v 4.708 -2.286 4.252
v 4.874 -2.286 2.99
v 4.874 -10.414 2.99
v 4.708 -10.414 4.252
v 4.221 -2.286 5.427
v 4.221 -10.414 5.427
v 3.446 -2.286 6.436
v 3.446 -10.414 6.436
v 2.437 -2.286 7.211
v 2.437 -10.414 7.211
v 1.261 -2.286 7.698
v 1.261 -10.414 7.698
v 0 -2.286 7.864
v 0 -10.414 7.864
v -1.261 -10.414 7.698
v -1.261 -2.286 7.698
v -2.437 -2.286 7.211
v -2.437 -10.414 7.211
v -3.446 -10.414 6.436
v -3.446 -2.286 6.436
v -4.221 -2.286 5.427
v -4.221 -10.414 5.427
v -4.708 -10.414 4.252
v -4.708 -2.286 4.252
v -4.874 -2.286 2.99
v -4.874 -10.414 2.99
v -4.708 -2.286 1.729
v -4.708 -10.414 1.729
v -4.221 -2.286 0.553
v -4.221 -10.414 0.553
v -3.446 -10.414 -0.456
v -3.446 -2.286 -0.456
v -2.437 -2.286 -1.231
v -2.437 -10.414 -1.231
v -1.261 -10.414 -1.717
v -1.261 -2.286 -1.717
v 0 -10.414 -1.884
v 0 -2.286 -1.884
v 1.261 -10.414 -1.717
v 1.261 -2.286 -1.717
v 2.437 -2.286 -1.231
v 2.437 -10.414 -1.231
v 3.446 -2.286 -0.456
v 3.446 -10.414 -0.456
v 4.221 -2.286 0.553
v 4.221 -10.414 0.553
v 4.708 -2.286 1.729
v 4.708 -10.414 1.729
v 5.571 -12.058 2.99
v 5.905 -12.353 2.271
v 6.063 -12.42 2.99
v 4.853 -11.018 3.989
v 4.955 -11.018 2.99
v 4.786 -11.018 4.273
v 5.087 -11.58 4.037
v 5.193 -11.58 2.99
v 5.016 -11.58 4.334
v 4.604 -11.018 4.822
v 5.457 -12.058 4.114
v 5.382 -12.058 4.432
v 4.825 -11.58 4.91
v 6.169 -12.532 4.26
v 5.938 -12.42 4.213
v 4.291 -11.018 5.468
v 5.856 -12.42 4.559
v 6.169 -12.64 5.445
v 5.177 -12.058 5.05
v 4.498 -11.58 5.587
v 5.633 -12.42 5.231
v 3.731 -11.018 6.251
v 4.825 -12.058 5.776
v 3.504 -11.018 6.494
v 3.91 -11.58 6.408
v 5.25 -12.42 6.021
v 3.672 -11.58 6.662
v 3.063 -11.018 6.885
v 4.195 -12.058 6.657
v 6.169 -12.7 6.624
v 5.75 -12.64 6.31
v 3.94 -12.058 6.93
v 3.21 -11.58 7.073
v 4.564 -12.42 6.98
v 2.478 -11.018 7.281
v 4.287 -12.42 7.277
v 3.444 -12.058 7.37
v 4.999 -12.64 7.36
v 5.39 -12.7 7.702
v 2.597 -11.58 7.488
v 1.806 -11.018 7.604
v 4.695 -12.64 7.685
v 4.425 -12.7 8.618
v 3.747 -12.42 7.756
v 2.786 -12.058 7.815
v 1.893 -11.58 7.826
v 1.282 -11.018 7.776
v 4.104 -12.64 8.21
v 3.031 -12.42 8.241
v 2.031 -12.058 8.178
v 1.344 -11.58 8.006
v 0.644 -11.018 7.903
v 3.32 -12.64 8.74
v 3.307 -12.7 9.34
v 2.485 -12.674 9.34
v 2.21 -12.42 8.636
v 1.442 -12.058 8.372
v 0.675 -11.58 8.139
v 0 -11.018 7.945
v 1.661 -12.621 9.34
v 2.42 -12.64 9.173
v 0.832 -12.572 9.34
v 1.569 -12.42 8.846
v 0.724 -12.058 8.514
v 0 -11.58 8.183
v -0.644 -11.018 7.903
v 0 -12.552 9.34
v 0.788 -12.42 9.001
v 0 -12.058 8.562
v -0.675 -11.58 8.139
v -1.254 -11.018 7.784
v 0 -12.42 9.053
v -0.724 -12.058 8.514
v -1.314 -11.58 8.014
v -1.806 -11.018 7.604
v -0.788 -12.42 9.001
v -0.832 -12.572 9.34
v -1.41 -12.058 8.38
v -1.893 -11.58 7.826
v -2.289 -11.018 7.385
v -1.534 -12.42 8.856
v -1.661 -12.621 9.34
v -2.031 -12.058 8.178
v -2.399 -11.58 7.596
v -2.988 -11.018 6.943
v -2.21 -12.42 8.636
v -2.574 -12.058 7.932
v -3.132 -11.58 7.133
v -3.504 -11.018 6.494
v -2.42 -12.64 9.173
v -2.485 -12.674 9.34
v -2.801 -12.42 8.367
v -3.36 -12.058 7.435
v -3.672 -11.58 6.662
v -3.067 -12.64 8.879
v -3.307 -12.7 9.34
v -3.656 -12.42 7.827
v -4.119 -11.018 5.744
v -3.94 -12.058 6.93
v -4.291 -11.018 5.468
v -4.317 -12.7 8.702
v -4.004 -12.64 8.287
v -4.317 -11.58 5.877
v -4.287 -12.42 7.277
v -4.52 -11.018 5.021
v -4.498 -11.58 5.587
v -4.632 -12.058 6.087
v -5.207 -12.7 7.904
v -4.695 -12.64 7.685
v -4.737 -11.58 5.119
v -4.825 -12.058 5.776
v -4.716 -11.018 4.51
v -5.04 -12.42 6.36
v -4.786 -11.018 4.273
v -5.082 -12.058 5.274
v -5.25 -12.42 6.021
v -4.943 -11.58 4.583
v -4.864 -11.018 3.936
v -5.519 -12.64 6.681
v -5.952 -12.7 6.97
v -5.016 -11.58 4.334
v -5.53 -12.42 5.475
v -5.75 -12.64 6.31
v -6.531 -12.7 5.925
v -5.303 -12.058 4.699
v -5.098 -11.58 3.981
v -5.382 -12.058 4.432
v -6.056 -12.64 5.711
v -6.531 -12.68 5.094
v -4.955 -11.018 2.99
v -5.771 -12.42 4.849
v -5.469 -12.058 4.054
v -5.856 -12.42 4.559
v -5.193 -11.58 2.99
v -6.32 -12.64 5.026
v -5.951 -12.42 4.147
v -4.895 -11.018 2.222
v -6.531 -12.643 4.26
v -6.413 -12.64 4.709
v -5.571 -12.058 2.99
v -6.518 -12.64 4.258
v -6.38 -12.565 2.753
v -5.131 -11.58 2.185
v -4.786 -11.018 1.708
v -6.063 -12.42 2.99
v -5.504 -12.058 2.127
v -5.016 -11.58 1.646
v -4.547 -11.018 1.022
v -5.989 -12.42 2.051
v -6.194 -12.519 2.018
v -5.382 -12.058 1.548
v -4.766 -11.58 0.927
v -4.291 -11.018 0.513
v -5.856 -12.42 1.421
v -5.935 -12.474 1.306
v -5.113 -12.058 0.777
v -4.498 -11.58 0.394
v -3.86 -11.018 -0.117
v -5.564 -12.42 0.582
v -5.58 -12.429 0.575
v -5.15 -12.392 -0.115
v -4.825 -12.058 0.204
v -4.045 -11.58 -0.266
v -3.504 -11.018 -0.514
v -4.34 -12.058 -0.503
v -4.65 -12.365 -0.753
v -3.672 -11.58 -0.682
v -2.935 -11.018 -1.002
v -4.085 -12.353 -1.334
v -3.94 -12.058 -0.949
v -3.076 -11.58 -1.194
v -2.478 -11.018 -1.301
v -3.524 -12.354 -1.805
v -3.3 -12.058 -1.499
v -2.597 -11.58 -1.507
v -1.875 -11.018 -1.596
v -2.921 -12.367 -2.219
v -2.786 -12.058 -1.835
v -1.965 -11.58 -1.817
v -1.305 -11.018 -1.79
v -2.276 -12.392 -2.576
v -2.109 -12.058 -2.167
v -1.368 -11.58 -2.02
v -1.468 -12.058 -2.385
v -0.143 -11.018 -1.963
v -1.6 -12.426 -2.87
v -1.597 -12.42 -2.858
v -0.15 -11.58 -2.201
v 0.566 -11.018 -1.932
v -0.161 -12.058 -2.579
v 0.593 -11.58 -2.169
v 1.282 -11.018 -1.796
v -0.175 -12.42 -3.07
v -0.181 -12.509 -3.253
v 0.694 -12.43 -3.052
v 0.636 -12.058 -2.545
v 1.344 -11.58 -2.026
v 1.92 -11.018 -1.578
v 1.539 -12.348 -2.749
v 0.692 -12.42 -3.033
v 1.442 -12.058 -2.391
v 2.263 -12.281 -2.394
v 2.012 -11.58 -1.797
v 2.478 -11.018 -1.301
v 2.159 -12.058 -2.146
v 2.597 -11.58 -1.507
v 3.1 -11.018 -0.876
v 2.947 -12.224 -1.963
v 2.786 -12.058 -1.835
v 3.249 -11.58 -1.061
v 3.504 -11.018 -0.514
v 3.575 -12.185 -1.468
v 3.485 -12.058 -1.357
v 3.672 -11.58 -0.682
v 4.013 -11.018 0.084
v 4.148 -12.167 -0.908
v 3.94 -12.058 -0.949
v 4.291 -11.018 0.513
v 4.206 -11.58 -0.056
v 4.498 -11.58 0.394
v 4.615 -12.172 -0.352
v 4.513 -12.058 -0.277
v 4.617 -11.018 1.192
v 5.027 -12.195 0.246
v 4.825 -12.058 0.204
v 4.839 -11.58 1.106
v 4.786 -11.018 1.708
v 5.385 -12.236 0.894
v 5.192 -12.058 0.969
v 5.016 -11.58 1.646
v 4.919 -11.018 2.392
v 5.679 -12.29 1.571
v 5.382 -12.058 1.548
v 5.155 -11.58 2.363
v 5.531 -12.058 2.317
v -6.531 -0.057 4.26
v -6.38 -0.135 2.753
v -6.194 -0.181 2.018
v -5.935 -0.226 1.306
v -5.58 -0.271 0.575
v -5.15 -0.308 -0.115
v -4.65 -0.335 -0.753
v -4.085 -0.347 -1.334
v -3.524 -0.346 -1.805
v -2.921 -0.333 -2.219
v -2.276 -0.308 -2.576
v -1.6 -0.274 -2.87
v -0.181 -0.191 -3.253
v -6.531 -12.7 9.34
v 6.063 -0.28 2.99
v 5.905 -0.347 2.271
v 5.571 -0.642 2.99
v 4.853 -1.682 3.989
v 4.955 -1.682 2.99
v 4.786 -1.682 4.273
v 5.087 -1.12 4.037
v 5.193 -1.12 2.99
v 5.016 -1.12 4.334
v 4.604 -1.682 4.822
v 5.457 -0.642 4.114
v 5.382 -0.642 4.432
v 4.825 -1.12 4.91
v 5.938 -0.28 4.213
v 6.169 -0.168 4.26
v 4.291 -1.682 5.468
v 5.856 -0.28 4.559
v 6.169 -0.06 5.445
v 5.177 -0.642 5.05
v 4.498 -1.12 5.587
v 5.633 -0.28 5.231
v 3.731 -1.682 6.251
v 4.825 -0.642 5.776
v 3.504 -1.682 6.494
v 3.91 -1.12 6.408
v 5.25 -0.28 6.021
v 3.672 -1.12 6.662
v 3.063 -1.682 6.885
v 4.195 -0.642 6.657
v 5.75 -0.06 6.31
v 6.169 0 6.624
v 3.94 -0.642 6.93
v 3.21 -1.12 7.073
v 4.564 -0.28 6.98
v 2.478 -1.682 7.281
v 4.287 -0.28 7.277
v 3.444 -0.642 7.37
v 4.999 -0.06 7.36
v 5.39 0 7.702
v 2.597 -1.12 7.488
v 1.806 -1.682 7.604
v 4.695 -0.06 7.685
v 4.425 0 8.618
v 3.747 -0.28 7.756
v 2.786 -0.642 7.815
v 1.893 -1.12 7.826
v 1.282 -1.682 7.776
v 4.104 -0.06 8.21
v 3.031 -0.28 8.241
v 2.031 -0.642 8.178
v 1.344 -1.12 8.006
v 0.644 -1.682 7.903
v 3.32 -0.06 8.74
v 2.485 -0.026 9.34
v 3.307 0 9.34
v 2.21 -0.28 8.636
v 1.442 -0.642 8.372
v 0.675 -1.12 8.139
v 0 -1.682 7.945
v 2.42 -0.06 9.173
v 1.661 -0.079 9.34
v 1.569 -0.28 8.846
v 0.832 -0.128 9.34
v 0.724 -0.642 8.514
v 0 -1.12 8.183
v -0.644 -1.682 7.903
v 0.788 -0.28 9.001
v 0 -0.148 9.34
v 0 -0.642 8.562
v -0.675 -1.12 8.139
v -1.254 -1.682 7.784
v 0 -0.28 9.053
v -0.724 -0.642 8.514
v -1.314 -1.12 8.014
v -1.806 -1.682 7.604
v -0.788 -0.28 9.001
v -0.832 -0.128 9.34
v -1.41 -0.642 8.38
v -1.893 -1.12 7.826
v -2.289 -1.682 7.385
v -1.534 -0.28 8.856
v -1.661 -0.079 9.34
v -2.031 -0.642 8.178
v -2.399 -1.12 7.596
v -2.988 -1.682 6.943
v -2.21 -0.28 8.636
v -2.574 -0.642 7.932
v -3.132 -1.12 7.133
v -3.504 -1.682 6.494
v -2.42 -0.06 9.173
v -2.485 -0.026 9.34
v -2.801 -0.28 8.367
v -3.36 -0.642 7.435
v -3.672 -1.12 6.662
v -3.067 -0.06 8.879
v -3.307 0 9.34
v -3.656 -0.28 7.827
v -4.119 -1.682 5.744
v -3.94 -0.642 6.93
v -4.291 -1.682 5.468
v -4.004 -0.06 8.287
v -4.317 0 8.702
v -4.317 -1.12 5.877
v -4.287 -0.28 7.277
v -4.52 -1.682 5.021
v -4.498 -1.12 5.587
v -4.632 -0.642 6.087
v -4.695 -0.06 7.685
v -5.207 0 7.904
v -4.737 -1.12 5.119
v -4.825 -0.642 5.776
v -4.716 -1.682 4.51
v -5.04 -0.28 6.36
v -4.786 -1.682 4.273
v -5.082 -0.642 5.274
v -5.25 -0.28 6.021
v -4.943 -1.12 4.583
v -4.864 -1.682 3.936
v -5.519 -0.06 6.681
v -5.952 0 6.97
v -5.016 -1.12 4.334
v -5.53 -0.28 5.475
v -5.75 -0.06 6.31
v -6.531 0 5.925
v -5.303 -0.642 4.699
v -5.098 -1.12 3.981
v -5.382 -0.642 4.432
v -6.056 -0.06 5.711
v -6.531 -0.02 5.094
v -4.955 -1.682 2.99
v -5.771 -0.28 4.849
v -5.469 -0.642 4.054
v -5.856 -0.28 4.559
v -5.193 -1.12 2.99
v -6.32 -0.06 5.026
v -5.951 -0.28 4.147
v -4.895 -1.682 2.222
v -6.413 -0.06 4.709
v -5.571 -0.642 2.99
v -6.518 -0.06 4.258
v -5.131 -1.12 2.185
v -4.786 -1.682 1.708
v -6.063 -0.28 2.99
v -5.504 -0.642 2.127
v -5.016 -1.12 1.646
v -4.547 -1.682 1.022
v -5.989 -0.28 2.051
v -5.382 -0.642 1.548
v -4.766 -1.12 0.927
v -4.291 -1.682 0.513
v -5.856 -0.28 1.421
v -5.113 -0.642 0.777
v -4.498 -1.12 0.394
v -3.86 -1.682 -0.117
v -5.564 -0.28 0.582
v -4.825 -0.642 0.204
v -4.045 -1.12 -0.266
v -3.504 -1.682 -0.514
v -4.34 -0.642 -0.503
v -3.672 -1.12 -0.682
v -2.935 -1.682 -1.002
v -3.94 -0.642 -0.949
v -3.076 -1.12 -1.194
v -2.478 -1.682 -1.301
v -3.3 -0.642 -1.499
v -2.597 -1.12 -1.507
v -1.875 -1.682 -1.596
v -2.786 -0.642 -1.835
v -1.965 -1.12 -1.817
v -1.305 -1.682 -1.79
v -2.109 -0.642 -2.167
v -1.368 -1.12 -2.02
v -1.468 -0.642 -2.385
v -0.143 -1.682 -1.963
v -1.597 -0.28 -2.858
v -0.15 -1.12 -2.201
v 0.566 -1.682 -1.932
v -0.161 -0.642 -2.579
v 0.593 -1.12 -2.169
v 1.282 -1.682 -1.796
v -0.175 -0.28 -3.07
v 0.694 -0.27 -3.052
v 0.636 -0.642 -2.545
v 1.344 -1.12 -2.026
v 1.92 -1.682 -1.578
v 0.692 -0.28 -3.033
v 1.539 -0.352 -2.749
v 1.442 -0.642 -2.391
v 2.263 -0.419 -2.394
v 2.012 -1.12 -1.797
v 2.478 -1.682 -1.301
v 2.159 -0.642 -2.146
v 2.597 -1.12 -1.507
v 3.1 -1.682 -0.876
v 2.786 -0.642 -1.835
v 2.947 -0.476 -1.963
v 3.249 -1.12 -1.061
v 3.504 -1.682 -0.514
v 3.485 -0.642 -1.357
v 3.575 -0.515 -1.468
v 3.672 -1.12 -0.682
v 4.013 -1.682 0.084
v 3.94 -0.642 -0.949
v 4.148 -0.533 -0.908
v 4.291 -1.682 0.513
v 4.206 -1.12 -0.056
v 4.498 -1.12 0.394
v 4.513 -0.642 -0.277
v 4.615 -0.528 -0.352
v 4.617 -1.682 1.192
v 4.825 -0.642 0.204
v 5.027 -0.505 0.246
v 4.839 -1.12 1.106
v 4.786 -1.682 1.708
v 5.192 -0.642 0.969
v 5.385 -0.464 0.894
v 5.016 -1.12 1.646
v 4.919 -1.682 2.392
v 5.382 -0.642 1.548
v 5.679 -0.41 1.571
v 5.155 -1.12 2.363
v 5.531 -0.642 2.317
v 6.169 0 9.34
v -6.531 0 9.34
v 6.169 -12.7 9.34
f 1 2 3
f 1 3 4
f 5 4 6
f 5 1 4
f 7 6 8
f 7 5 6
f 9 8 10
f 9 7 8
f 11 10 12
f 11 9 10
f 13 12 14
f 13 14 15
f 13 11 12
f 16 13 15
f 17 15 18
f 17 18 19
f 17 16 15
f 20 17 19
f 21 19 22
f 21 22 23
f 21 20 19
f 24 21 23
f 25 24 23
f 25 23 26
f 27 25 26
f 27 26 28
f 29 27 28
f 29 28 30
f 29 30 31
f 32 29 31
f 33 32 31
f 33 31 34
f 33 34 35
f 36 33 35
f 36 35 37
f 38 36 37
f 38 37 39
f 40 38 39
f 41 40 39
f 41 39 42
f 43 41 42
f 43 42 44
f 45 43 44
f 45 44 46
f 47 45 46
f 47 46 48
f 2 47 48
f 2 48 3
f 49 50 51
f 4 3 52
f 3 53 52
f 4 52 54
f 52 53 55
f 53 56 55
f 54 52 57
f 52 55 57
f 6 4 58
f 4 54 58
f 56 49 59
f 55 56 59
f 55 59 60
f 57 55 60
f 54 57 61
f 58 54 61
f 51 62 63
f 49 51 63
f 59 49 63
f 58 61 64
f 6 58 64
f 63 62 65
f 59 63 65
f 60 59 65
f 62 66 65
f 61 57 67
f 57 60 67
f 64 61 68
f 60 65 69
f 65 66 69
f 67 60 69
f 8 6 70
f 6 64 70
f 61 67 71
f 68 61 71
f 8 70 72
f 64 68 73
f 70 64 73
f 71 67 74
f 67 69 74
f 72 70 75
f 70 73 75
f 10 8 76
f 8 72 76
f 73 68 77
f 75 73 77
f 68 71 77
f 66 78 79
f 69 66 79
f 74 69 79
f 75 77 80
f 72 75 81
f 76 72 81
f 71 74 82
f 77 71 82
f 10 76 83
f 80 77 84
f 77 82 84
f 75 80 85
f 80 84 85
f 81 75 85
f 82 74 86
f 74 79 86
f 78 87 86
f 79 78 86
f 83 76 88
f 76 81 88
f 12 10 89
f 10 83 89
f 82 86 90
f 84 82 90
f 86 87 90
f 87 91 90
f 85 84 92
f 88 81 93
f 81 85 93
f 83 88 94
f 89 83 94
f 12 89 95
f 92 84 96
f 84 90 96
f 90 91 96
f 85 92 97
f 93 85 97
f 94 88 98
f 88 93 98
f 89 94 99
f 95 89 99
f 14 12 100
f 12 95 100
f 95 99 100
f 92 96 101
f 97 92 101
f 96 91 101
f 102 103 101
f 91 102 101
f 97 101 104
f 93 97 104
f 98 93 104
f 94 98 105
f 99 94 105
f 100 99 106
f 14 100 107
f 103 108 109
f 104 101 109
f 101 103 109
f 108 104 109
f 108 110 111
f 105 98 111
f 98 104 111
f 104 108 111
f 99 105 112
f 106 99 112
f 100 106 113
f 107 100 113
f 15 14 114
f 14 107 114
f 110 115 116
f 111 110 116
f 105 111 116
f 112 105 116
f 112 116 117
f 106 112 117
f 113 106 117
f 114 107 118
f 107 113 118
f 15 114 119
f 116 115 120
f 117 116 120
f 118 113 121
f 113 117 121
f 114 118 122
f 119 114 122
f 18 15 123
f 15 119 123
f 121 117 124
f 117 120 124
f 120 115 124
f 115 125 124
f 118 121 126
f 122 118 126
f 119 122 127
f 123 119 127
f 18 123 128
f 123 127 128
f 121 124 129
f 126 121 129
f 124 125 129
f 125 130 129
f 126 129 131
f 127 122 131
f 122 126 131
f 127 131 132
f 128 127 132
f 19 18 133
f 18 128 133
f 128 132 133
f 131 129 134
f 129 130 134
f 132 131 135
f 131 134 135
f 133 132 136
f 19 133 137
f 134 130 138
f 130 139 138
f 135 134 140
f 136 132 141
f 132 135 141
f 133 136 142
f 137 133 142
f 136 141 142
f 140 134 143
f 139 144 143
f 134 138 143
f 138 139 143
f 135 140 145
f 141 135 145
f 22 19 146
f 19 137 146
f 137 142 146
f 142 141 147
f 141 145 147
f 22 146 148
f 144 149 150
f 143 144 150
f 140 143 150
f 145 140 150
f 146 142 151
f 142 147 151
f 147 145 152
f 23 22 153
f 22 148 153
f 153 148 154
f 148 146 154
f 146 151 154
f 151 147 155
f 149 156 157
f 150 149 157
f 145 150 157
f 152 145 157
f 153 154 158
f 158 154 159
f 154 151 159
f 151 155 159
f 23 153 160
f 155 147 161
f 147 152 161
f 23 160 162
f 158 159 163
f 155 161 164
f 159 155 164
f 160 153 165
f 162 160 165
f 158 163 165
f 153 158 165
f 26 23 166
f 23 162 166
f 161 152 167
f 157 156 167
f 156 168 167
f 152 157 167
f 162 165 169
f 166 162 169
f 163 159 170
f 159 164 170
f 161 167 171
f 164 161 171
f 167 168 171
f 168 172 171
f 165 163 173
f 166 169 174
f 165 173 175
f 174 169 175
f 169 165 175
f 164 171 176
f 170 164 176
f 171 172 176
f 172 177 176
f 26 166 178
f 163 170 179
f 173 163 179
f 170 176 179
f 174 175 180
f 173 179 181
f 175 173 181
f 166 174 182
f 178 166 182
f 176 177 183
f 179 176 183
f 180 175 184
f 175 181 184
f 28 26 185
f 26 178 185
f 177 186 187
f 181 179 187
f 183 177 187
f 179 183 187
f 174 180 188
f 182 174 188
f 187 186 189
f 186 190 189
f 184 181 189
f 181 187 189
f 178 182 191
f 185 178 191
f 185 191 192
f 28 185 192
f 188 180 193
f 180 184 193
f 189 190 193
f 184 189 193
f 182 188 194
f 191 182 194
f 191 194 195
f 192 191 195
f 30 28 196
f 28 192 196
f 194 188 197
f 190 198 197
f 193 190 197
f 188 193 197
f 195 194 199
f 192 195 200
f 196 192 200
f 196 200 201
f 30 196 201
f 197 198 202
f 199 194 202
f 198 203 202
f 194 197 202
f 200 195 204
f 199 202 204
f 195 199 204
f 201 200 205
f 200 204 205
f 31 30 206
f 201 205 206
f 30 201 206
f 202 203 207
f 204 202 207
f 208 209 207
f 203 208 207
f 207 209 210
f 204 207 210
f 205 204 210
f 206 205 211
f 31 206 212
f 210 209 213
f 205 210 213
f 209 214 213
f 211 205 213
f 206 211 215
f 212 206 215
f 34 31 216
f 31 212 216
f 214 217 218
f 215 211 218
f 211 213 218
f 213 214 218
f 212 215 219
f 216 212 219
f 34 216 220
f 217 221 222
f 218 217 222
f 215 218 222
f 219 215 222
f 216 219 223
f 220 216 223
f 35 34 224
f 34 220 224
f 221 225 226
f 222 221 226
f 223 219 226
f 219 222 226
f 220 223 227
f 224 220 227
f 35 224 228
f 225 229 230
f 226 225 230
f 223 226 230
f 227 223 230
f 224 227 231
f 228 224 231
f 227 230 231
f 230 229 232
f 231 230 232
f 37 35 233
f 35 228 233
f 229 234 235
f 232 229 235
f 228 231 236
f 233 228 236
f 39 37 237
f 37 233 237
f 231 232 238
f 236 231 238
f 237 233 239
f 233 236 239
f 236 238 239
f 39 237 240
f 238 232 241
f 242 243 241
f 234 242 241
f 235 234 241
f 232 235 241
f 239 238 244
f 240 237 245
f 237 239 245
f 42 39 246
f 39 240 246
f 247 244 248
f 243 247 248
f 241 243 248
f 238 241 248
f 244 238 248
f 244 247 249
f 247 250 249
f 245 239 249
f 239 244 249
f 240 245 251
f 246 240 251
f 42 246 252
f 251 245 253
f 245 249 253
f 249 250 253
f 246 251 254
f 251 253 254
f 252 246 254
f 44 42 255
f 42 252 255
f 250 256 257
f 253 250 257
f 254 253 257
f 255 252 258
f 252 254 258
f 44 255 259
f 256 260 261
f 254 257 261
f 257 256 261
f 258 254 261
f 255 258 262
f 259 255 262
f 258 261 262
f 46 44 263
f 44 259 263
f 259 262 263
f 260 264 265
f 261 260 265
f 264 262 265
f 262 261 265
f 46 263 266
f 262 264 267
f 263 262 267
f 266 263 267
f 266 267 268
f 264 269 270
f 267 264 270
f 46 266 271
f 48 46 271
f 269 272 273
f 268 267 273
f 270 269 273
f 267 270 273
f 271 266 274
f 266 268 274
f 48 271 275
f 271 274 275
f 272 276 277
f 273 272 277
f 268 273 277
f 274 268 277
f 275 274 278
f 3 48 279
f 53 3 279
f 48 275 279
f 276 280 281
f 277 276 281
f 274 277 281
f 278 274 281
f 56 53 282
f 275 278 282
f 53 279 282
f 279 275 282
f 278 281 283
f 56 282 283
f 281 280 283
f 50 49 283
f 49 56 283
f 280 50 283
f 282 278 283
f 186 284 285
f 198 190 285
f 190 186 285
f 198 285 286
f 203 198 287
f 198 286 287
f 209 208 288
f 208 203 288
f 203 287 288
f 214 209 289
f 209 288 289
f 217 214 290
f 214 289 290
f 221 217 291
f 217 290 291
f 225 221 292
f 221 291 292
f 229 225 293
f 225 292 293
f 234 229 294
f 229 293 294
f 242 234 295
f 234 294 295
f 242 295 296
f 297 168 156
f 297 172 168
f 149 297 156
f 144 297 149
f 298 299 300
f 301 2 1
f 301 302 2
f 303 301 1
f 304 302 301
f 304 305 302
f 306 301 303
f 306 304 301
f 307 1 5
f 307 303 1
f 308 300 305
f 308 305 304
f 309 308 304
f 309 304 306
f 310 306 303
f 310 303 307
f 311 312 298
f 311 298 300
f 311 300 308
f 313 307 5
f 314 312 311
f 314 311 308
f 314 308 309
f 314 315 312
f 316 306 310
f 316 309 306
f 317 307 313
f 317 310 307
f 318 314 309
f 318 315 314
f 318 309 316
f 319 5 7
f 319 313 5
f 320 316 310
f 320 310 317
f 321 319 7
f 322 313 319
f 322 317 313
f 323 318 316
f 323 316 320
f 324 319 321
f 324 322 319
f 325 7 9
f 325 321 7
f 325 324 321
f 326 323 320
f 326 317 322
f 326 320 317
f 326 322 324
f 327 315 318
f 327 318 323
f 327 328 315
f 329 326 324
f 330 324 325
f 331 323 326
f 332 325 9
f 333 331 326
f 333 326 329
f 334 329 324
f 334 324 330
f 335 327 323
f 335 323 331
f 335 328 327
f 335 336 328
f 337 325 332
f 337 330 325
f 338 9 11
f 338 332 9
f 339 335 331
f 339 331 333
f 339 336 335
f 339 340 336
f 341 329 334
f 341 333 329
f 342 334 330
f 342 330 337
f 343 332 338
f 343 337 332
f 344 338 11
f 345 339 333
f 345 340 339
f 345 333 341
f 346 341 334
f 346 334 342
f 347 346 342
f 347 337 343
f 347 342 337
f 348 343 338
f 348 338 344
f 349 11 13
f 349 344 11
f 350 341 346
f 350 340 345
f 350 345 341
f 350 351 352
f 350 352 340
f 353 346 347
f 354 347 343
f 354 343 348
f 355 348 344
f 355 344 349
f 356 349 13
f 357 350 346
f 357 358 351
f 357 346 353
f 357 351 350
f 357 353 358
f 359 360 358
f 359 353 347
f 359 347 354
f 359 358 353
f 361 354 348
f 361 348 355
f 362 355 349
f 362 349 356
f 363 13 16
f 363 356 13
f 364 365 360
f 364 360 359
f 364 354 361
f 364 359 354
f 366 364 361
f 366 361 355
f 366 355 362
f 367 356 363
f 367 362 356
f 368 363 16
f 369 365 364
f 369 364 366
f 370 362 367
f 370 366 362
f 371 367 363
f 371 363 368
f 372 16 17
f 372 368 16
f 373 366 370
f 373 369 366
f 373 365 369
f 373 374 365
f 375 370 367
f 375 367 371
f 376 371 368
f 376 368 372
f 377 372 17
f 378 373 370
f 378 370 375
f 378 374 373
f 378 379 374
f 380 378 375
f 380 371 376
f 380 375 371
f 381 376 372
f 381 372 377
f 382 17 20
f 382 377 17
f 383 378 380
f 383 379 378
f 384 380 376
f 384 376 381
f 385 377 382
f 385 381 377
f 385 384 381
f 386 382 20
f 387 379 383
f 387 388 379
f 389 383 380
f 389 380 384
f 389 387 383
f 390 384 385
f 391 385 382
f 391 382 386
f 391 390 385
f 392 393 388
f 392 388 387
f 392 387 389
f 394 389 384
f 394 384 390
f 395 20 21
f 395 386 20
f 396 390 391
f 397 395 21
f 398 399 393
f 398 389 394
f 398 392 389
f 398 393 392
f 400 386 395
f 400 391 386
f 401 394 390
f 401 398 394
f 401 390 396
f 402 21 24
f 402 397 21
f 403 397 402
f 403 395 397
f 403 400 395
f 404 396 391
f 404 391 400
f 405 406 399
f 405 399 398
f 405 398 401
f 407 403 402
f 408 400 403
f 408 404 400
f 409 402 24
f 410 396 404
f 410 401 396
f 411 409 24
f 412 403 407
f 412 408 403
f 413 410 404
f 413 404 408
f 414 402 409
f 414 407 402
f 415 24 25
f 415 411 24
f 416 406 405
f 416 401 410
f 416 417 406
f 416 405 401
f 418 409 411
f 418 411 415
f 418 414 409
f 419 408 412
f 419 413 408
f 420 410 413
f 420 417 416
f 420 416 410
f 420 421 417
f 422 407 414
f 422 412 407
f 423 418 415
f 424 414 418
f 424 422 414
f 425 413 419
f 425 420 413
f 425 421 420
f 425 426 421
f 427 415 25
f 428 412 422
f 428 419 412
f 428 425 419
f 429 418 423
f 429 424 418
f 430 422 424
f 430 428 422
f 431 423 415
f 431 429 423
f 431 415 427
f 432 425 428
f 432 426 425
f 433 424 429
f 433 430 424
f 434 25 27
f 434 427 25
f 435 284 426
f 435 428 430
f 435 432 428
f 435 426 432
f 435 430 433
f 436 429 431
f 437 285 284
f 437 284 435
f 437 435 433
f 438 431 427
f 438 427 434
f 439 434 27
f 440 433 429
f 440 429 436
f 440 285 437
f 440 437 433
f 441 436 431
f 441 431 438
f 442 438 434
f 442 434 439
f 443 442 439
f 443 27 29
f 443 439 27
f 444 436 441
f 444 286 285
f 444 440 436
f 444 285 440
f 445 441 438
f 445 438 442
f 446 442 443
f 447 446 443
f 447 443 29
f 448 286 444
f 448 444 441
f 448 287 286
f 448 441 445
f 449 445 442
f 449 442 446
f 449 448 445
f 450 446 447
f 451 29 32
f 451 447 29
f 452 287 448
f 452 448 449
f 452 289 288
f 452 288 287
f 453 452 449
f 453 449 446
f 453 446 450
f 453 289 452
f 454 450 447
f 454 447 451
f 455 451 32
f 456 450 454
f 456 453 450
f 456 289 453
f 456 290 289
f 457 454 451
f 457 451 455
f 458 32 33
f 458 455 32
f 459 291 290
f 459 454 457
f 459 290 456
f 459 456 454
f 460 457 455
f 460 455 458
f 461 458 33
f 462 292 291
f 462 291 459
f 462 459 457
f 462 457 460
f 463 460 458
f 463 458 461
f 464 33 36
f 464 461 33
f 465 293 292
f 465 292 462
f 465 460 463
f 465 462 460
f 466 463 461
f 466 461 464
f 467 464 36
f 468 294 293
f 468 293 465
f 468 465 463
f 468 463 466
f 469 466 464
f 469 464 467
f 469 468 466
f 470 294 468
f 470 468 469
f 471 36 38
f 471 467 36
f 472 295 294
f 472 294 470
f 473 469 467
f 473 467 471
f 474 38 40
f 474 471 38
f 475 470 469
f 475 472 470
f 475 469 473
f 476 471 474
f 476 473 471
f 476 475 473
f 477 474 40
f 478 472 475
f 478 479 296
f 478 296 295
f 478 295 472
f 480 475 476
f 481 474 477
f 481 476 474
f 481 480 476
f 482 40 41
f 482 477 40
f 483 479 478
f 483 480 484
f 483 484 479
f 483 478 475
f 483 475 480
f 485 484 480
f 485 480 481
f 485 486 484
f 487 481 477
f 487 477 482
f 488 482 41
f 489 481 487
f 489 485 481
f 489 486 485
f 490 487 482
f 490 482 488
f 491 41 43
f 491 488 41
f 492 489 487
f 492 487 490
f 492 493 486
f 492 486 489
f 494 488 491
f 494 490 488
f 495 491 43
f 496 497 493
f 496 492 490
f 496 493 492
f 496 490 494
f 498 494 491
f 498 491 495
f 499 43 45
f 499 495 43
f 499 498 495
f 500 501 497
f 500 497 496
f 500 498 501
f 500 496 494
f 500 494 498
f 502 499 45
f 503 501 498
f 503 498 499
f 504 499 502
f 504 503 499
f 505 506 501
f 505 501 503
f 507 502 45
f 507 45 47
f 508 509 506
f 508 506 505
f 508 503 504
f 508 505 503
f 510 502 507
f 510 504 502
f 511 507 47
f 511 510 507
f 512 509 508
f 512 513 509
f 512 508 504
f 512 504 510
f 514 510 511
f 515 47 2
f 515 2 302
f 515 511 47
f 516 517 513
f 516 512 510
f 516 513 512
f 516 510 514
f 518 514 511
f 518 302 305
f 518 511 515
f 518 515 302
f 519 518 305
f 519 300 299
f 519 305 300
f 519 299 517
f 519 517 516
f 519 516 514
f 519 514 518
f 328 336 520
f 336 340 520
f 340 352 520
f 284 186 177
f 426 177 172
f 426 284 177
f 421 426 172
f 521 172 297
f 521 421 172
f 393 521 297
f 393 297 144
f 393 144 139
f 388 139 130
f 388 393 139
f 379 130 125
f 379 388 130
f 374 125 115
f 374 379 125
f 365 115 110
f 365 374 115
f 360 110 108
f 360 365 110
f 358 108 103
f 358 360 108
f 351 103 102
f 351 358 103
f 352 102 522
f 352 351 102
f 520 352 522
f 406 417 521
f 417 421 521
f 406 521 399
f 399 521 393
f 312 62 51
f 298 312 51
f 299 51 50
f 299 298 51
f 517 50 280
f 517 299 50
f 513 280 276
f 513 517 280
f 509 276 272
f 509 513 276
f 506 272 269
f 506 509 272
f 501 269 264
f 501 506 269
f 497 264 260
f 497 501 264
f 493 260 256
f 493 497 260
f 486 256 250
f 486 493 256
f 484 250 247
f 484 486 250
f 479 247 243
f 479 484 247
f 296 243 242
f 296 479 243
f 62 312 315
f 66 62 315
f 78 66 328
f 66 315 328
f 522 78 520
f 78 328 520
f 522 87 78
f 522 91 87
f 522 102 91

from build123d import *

# Parameters (mm, degrees)
F0_W        = 12.7
F0_H        = 12.7
F0_R        = 4.8737037562
F1_DEPTH    = 12.7
F3_T1_DEPTH = 50.8


# Not quite as in the source:
# - a fillet or chamfer that OpenCascade refuses, or shapes differently, is made with other operations: its cross-section is extruded or revolved along the edge and cut away or added


with BuildPart() as f1:
    # F0 (on Front) → F1 (new body)
    with BuildSketch(Plane.XZ):
        with Locations((-0.180745963, 2.9901557426)):
            Rectangle(F0_W, F0_H)
        with Locations((0, 2.9901557426)):
            Circle(F0_R, mode=Mode.SUBTRACT)
    extrude(amount=F1_DEPTH)

    # F2: fillet of radius 2.286 on 2 edges, made by hand

    # F2_s1 → F2_t2 (revolve, cut)
    with BuildSketch(Plane.XY.offset(2.9901557426)):
        with BuildLine():
            ThreePointArc((4.8737037562, -10.414), (5.5432576544, -12.0304461018), (7.1597037562, -12.7))
            Line((7.1597037562, -12.7), (4.8737037562, -12.7))
            Line((4.8737037562, -12.7), (4.8737037562, -10.414))
        make_face()
    revolve(axis=Axis((0, -12.7, 2.9901557426), (0, -1, 0)), mode=Mode.SUBTRACT)

    # F2_s3 → F2_t4 (revolve, cut)
    with BuildSketch(Plane.XY.offset(2.9901557426)):
        with BuildLine():
            ThreePointArc((4.8737037562, -2.286), (5.5432576544, -0.6695538982), (7.1597037562, 0))
            Line((7.1597037562, 0), (4.8737037562, 0))
            Line((4.8737037562, 0), (4.8737037562, -2.286))
        make_face()
    revolve(axis=Axis((0, 0, 2.9901557426), (0, -1, 0)), mode=Mode.SUBTRACT)

    # F3: fillet of radius 7.62 on 2 edges, made by hand

    # F3_s2 → F3_t1 (cut)
    with BuildSketch(Plane.XZ.offset(-19.05)):
        with BuildLine():
            ThreePointArc((6.169254037, 4.2601557426), (3.9374077096, -1.12799793), (-1.450745963, -3.3598442574))
            Line((-1.450745963, -3.3598442574), (6.169254037, -3.3598442574))
            Line((6.169254037, -3.3598442574), (6.169254037, 4.2601557426))
        make_face()
        with BuildLine():
            ThreePointArc((-6.530745963, 4.2601557426), (-4.2988996356, -1.12799793), (1.089254037, -3.3598442574))
            Line((1.089254037, -3.3598442574), (-6.530745963, -3.3598442574))
            Line((-6.530745963, -3.3598442574), (-6.530745963, 4.2601557426))
        make_face()
    extrude(amount=F3_T1_DEPTH, mode=Mode.SUBTRACT)


solid = f1.part
